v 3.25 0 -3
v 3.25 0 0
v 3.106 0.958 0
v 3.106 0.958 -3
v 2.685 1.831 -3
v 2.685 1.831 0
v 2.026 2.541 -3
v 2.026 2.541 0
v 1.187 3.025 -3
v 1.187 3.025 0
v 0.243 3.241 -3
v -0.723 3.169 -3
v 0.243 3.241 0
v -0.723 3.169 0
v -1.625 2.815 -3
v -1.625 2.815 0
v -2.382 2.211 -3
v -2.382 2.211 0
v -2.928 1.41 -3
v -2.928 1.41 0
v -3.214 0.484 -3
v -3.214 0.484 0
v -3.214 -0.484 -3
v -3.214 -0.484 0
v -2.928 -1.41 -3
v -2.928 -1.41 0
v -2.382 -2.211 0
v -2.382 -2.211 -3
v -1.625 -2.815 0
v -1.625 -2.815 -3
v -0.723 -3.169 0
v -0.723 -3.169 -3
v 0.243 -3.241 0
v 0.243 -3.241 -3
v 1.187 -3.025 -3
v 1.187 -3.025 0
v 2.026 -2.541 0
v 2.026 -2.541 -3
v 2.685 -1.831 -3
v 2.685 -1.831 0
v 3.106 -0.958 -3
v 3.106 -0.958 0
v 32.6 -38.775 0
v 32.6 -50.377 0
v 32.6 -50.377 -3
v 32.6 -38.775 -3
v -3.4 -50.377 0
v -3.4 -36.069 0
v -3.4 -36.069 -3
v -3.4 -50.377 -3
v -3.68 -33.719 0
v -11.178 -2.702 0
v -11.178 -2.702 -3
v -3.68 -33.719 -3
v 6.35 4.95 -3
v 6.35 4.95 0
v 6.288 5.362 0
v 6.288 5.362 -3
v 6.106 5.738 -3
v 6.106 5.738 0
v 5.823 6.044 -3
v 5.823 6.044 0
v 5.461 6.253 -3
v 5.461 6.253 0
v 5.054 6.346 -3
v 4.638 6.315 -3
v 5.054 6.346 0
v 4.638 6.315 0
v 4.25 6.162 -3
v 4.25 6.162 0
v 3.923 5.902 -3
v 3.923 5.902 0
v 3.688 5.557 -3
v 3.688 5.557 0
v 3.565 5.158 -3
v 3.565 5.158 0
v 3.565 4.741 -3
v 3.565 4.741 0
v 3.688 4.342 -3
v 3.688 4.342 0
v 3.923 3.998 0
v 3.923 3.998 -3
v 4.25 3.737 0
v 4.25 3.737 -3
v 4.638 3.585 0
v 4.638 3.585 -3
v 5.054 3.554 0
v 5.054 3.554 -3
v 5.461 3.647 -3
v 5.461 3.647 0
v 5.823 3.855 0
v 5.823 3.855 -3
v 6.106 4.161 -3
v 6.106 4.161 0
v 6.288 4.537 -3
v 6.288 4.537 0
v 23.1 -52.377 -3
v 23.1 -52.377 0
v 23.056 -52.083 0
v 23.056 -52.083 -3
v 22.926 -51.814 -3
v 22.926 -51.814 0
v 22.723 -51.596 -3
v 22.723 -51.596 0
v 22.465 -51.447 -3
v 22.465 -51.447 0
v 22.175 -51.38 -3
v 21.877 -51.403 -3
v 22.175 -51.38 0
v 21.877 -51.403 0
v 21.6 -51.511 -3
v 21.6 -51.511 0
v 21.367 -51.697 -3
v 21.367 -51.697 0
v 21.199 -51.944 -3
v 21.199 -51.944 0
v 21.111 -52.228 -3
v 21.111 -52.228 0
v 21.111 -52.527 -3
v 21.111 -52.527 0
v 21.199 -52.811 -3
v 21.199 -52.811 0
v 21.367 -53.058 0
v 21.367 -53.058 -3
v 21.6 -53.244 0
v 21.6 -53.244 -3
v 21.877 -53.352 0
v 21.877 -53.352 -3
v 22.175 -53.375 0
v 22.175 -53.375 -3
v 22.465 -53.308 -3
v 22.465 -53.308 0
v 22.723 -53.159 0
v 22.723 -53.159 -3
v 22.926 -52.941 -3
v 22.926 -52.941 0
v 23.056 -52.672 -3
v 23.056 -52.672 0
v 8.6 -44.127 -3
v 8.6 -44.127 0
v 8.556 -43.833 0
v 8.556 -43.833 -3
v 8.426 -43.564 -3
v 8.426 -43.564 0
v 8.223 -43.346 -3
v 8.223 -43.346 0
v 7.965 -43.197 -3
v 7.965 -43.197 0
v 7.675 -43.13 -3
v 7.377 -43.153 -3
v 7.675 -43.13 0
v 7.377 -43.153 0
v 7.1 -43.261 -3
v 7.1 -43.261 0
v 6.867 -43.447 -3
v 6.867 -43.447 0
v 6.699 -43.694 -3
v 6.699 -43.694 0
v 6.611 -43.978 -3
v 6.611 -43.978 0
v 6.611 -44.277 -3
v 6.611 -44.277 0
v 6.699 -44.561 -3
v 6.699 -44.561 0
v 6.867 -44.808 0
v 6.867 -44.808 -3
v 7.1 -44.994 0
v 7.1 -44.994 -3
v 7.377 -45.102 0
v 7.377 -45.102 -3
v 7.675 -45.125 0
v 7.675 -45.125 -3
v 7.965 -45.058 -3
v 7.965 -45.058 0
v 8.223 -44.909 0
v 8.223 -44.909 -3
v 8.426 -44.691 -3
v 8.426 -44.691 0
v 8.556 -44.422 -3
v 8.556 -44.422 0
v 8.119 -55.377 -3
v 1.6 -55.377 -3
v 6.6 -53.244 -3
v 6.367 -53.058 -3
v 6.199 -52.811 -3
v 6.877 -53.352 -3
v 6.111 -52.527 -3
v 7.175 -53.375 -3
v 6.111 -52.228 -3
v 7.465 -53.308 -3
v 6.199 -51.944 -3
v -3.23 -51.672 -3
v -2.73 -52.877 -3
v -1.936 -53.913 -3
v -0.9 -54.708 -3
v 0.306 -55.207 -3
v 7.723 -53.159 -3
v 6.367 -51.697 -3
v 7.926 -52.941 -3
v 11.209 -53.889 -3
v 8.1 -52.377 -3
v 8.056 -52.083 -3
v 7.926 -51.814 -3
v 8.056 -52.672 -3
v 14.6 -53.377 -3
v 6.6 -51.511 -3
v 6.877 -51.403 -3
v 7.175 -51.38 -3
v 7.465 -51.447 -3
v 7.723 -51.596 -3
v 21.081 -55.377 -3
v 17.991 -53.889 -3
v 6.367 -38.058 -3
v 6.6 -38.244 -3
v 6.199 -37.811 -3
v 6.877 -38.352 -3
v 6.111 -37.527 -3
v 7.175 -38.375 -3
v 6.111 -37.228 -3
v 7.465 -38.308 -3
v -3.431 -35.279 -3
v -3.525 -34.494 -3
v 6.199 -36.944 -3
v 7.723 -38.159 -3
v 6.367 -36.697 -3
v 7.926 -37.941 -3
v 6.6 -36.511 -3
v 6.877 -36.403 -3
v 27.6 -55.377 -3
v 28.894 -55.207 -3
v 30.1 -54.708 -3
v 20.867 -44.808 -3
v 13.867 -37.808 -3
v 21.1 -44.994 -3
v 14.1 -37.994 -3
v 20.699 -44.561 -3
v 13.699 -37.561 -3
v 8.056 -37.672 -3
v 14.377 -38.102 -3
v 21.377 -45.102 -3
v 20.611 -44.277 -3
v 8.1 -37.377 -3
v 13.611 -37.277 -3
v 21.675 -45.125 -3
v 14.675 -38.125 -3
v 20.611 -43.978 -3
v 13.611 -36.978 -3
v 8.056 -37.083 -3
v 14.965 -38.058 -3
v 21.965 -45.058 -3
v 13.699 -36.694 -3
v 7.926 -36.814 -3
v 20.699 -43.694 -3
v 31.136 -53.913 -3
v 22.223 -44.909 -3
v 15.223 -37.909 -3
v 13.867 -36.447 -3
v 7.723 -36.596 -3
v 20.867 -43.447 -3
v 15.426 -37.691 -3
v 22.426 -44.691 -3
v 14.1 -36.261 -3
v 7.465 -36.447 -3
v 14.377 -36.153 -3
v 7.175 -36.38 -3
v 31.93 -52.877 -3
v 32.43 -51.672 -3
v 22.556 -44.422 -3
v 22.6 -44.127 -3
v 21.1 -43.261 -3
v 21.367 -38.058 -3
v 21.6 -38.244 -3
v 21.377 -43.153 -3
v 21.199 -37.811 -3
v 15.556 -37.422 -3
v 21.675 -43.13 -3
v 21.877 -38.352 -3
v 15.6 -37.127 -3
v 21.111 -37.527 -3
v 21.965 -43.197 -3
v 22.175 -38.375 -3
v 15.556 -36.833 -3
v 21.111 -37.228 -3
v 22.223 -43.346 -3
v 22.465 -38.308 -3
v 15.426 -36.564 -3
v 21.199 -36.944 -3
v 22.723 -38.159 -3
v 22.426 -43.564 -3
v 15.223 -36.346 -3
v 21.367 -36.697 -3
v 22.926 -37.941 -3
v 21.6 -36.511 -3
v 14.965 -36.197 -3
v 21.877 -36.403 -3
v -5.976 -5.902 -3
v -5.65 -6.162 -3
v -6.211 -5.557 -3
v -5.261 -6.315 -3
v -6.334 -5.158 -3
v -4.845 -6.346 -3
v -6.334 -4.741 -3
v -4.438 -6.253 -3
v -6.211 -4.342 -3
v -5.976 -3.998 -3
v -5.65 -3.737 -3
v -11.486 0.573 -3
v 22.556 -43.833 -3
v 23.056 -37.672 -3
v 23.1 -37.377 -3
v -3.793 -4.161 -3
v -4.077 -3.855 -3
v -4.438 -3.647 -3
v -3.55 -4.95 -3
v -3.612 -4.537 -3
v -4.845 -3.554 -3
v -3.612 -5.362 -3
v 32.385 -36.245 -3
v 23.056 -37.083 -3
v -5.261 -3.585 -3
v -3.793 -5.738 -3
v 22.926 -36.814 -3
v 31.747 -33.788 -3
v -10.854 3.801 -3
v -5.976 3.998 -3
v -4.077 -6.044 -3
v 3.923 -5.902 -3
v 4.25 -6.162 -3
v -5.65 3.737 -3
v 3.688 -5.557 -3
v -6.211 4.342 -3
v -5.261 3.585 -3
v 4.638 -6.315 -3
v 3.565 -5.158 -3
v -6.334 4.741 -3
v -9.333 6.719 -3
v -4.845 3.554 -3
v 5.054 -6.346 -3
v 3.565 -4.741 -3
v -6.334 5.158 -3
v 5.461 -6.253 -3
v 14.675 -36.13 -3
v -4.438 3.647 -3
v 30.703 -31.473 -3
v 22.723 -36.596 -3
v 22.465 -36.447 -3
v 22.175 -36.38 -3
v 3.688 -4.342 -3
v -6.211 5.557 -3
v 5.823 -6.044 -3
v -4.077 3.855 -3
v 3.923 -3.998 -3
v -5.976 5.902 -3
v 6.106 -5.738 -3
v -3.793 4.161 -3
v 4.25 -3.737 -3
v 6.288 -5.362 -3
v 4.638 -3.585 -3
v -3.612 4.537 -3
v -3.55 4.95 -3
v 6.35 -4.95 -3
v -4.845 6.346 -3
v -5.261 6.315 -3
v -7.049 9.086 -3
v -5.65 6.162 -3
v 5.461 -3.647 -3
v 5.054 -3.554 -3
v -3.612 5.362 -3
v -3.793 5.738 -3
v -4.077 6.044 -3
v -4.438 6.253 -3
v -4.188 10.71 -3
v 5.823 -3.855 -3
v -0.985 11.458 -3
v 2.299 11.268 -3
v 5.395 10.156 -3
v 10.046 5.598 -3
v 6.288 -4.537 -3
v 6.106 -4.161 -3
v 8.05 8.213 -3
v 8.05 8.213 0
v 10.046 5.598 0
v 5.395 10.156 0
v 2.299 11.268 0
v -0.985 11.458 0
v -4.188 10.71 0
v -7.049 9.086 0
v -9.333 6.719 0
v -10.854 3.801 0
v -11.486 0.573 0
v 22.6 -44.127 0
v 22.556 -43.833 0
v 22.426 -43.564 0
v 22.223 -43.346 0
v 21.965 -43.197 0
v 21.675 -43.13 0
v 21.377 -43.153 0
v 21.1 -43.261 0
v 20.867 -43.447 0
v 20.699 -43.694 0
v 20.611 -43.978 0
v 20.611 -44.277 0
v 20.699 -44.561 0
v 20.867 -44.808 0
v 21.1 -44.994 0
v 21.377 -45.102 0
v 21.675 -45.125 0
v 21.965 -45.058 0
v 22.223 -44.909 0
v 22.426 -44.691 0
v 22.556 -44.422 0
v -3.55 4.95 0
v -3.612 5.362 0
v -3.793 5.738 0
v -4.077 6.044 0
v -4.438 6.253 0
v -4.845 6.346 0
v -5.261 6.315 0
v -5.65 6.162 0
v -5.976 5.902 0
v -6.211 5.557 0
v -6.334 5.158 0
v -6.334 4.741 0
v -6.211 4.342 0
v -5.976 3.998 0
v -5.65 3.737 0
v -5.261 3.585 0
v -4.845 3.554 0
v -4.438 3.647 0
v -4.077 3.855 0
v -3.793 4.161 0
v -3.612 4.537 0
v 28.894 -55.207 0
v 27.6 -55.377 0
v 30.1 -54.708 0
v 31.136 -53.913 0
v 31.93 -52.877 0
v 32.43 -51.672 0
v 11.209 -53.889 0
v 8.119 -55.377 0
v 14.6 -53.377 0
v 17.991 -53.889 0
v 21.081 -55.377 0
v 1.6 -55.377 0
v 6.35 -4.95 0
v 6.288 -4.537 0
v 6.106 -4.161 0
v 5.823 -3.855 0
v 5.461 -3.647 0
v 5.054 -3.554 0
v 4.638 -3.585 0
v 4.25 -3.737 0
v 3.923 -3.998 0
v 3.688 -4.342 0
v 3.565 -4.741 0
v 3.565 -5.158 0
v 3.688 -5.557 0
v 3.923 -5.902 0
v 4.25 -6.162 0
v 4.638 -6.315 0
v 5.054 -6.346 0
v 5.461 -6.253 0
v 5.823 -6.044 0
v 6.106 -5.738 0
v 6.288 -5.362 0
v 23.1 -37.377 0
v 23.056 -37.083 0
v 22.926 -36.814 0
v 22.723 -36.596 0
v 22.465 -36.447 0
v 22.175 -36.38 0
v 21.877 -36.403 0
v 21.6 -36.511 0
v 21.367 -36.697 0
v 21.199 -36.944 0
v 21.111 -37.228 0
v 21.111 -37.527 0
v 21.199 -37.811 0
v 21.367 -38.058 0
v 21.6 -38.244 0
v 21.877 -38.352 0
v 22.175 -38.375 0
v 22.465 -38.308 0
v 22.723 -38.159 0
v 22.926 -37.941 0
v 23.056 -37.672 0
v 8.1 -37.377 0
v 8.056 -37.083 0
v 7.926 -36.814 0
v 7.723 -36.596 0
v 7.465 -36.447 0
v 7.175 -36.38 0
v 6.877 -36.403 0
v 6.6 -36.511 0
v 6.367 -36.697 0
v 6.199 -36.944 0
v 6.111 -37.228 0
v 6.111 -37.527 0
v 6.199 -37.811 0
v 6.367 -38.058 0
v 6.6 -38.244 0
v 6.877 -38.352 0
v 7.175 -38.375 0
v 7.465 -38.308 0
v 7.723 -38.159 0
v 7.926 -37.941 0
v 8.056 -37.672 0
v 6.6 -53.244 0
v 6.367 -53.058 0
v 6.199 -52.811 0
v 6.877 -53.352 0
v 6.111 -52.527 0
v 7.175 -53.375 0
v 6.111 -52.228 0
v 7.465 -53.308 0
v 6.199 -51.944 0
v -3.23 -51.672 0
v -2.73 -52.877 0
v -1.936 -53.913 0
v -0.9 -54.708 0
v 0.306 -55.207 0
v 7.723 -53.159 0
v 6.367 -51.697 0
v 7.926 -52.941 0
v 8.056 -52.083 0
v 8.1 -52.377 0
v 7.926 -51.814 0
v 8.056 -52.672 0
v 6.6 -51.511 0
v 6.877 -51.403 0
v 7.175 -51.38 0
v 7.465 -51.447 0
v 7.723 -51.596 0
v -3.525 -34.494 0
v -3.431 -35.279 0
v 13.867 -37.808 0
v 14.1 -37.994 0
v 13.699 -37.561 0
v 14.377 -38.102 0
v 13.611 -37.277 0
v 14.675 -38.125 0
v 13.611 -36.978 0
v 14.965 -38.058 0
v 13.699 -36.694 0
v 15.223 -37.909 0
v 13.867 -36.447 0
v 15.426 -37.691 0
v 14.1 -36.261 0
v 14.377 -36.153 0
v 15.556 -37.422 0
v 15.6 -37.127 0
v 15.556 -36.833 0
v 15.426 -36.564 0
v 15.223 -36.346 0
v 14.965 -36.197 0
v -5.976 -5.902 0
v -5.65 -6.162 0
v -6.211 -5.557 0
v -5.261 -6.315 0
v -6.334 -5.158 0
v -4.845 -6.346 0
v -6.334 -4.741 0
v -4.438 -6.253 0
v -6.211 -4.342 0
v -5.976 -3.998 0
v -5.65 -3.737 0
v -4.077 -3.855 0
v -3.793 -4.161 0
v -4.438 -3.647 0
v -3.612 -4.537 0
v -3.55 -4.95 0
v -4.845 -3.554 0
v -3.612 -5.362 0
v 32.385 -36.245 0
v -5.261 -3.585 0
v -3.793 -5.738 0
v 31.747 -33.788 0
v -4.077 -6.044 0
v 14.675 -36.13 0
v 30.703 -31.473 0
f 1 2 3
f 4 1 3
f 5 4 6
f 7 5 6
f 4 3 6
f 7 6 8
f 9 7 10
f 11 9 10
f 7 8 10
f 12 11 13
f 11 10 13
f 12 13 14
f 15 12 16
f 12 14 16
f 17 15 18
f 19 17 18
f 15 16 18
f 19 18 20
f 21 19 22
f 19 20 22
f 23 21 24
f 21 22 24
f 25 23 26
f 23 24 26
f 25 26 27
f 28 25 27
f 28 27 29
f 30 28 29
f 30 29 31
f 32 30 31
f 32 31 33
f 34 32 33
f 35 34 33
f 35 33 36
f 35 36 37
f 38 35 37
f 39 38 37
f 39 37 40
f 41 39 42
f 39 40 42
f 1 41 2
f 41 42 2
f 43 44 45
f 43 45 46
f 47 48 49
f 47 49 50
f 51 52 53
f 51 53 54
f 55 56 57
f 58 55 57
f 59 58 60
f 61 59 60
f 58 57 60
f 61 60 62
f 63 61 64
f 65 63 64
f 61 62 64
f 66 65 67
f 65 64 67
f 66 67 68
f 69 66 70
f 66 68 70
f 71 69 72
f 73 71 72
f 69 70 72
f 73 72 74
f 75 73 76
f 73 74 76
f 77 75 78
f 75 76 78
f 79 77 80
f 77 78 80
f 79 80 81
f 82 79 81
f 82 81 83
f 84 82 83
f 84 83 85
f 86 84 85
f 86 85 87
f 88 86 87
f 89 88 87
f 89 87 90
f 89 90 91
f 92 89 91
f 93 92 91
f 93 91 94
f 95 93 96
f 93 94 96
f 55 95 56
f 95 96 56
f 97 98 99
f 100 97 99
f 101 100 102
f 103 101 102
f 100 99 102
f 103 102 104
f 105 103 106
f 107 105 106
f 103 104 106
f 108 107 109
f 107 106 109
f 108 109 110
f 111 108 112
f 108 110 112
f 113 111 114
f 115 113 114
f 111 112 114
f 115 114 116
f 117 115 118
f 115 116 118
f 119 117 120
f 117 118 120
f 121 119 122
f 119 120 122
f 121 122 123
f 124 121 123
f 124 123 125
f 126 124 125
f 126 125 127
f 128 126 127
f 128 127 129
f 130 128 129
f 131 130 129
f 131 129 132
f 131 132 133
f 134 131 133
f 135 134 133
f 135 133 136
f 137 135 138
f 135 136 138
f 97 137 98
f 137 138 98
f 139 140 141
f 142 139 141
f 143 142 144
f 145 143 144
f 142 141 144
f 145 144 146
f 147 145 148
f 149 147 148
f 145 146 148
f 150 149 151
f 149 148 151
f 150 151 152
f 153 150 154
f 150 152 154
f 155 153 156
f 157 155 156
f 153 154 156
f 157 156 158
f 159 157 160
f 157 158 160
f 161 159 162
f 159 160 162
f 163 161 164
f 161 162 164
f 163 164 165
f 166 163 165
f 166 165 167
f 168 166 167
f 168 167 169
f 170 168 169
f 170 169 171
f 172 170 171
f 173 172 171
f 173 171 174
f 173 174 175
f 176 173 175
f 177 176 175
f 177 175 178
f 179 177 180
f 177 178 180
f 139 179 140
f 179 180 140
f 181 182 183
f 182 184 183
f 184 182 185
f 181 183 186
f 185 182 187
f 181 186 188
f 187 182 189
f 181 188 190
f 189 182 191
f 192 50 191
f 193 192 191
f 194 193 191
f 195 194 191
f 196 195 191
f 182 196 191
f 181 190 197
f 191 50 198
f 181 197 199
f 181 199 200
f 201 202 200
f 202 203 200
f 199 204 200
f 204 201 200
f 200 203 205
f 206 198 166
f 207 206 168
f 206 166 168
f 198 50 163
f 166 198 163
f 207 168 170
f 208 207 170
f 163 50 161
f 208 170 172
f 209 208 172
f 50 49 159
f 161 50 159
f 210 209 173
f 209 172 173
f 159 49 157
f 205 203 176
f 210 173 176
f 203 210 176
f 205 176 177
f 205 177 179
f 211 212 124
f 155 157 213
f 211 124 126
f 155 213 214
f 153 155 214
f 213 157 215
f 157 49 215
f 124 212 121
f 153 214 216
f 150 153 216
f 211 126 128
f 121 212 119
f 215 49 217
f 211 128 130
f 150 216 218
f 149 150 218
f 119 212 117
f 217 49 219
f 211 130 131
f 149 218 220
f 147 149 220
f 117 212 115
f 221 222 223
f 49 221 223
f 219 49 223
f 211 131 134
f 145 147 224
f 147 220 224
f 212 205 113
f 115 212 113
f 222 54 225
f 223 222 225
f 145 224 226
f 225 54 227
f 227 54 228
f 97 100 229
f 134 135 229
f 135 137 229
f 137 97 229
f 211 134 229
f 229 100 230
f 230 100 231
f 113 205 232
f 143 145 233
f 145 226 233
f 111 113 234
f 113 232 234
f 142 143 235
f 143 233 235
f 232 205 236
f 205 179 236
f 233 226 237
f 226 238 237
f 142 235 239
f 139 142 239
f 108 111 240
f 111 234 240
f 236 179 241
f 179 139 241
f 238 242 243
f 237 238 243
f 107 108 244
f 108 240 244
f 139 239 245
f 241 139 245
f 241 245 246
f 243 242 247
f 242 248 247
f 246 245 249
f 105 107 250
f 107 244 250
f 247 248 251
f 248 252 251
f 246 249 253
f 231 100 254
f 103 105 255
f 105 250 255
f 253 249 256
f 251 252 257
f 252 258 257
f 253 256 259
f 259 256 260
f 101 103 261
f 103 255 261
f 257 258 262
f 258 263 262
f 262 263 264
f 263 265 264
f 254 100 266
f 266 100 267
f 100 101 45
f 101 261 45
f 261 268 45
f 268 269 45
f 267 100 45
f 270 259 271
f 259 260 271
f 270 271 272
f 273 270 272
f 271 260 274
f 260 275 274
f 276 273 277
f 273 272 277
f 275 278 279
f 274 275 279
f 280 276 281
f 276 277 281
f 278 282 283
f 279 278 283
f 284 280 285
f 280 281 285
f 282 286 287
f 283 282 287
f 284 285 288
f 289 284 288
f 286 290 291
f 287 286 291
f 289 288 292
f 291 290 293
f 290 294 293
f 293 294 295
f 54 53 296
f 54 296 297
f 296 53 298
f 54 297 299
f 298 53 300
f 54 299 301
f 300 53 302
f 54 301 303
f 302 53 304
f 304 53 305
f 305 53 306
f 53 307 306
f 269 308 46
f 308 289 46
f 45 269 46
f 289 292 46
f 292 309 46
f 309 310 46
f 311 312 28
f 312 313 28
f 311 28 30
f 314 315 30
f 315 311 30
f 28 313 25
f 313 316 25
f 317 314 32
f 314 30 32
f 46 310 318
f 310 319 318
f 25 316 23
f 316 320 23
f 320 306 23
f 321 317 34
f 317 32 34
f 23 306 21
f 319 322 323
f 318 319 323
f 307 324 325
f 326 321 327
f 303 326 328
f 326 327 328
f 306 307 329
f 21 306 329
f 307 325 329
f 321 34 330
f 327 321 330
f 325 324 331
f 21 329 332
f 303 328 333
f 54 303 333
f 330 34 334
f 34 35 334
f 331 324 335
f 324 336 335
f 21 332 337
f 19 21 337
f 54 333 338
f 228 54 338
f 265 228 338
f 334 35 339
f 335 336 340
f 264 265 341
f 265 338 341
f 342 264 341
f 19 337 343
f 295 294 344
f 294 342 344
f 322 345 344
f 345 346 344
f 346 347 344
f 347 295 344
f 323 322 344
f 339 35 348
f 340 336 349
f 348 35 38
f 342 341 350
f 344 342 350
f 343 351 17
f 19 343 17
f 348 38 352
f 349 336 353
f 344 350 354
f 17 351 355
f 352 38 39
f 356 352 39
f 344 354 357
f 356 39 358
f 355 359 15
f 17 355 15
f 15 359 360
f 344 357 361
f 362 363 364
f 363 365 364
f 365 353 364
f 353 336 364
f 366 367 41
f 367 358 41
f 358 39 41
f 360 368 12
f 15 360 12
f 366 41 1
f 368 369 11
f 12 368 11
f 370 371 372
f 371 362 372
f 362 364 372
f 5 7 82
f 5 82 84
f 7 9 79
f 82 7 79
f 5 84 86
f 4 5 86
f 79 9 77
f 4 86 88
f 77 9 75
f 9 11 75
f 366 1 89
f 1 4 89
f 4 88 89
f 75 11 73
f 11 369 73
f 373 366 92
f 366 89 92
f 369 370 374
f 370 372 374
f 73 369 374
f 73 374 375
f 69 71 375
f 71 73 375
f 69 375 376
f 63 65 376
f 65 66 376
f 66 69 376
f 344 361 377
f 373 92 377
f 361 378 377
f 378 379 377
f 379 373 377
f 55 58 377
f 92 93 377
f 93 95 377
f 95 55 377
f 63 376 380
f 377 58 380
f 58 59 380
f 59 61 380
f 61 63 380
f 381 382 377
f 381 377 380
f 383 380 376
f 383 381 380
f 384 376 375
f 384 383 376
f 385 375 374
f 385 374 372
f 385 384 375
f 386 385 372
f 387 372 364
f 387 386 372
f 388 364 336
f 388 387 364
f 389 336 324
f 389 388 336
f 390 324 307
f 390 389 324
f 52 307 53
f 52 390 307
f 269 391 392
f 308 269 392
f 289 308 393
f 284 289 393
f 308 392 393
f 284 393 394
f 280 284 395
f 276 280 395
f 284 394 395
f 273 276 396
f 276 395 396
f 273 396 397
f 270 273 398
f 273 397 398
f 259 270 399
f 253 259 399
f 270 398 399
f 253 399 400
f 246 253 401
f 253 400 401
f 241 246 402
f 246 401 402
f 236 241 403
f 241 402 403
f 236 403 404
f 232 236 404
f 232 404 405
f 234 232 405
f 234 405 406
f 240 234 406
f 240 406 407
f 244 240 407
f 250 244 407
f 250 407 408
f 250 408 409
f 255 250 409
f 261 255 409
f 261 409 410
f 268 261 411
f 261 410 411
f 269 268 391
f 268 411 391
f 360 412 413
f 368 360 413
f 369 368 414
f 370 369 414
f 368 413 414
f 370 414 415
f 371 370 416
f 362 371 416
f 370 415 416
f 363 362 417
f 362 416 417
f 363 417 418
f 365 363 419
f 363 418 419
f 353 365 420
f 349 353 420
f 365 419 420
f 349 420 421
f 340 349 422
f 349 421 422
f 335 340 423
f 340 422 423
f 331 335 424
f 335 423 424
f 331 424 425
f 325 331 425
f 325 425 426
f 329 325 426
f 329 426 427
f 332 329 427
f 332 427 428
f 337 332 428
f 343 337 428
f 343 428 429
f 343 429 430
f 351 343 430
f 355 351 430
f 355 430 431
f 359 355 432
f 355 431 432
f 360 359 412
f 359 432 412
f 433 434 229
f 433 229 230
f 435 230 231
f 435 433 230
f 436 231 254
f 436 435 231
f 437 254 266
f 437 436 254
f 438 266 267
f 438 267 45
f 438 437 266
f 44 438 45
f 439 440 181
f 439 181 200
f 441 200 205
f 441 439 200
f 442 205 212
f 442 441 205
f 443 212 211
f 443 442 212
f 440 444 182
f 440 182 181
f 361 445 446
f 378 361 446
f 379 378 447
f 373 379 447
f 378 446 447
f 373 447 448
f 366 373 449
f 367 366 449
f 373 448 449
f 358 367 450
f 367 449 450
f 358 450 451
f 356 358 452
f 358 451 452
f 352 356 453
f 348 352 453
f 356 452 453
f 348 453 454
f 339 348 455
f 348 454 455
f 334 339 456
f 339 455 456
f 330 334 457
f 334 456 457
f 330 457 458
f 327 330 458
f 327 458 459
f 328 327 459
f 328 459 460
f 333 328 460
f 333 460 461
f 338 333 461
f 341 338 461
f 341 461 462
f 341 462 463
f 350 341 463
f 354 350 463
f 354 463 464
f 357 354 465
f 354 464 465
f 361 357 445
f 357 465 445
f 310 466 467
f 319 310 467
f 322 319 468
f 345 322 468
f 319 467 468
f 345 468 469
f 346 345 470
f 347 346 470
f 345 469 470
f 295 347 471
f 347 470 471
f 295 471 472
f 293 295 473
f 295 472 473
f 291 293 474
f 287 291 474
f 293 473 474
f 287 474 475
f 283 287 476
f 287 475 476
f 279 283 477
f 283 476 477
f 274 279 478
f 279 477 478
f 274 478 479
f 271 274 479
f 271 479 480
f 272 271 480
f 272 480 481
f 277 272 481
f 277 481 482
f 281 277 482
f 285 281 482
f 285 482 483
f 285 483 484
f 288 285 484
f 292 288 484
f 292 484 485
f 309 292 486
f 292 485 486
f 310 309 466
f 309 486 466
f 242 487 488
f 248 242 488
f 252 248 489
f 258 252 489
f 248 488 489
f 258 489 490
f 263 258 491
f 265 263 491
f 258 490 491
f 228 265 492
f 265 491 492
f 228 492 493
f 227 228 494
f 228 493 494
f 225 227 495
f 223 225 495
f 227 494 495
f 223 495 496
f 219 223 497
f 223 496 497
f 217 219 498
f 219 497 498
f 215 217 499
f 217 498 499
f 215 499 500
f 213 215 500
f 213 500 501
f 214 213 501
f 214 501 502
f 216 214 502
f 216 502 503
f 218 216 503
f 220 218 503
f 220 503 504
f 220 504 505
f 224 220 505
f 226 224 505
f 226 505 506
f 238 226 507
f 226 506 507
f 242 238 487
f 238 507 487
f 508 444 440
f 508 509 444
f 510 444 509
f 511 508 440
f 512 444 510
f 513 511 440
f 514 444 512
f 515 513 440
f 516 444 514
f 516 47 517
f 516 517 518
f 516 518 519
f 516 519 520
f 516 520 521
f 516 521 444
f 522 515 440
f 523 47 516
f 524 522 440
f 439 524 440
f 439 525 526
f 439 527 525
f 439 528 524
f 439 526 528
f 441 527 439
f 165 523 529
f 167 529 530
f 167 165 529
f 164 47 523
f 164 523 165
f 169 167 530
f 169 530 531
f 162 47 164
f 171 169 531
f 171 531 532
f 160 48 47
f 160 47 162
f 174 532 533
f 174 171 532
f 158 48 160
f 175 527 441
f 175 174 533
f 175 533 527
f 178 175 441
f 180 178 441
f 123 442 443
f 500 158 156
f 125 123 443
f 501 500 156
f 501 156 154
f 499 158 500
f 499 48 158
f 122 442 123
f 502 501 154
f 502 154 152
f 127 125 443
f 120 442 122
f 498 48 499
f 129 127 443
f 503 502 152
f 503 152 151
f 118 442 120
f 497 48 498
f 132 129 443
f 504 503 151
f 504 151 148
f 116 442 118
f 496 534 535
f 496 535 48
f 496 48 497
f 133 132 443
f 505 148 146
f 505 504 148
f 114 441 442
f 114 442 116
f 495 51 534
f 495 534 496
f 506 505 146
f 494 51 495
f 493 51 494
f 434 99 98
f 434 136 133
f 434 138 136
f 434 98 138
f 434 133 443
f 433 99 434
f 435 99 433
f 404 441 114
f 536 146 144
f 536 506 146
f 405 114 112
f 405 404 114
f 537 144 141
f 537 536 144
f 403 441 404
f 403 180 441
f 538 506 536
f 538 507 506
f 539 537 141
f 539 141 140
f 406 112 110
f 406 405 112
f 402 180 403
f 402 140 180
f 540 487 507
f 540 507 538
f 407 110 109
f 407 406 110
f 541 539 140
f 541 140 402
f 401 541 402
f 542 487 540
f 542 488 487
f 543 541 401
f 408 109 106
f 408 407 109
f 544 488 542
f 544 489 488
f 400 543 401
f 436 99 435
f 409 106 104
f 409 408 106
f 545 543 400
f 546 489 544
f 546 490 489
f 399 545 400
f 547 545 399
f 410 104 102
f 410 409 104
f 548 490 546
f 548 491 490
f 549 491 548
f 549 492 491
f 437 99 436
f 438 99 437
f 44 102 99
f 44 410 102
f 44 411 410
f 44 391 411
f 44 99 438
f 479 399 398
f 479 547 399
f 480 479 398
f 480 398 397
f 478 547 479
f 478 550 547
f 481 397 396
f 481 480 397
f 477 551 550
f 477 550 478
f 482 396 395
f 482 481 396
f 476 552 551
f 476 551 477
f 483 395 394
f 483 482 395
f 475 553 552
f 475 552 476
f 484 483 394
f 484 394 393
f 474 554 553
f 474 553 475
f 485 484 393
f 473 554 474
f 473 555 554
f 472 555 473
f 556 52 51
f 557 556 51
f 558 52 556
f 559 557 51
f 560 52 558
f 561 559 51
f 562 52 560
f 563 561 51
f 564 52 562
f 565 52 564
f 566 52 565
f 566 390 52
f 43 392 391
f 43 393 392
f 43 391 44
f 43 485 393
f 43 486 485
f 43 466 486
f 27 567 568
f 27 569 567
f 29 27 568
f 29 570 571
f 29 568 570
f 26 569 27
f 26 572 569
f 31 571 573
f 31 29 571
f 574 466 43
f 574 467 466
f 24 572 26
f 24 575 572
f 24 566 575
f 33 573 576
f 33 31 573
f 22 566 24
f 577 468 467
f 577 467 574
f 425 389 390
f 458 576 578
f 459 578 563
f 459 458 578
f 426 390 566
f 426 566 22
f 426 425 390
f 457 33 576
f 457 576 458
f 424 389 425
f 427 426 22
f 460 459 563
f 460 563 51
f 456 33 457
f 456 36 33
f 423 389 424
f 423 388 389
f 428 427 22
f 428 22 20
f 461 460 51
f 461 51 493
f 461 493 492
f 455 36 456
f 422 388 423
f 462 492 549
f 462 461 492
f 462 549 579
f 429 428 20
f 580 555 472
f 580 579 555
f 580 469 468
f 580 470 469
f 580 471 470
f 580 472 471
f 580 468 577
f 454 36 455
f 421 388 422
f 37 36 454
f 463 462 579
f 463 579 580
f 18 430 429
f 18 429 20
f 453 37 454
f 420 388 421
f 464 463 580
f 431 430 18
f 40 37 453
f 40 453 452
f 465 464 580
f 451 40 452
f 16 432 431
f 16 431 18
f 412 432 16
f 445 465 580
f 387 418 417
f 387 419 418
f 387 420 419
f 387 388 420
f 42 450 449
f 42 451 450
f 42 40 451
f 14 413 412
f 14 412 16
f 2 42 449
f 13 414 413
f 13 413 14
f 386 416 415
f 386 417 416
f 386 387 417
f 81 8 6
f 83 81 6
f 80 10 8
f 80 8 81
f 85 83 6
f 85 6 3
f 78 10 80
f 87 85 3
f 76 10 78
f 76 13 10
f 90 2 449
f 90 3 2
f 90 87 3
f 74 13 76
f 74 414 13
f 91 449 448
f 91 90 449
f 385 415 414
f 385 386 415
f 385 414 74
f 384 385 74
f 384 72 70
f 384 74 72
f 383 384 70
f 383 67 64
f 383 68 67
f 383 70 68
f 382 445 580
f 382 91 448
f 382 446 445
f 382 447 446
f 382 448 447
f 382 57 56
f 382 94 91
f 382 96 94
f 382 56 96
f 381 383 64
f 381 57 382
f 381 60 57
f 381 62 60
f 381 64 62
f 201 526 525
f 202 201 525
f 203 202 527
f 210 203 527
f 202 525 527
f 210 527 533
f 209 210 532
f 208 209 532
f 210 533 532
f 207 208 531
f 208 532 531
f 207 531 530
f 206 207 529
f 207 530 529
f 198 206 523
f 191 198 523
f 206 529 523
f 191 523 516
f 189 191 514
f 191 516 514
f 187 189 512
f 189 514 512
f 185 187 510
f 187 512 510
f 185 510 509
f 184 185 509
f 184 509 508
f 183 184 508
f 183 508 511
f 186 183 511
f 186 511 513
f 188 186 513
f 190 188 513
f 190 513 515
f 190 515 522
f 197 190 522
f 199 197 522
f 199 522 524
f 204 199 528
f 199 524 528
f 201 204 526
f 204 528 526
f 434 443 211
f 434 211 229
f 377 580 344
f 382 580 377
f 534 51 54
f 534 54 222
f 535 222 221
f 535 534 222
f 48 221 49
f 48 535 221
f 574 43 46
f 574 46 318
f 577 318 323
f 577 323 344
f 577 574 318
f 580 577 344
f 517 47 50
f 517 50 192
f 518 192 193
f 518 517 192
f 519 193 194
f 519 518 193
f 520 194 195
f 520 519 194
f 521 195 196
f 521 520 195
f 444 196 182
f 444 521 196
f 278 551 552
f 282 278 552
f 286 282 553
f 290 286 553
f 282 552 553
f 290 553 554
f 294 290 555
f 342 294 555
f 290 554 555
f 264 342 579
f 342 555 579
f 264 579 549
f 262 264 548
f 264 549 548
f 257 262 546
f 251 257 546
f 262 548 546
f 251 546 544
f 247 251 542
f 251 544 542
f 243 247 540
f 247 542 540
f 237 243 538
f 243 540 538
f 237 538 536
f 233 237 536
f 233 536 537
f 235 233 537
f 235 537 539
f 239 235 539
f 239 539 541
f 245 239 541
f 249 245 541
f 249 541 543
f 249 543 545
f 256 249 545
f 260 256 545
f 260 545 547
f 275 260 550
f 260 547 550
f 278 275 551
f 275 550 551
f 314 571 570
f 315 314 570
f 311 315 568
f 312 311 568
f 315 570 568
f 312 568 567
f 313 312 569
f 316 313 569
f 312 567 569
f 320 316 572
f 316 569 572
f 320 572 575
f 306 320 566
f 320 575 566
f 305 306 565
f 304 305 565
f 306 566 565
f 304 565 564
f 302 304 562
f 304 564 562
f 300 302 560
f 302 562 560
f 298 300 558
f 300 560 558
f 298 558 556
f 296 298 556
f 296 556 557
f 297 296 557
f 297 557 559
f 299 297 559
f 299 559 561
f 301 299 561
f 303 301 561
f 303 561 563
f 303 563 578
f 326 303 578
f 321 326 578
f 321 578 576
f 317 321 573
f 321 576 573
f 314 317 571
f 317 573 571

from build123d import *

# Parameters (mm, degrees)
SKETCH_1_R      = 3.25
SKETCH_1_R_2    = 1.4
SKETCH_1_R_3    = 1
EXTRUDE_1_DEPTH = 3


with BuildPart() as part:
    # Эскиз1 → Бобышка-Вытянуть1 (new body)
    with BuildSketch(Plane.XY):
        with BuildLine():
            Line((1.6, -55.377499952), (8.119259302, -55.377499952))
            ThreePointArc((8.119259302, -55.377499952), (14.6, -53.377499952), (21.080740698, -55.377499952))
            Line((21.080740698, -55.377499952), (27.6, -55.377499952))
            ThreePointArc((27.6, -55.377499952), (31.135533906, -53.913033858), (32.6, -50.377499952))
            Line((32.6, -50.377499952), (32.6, -38.774674064))
            ThreePointArc((32.6, -38.774674064), (32.11800347, -35.002728245), (30.702989966, -31.473191066))
            Line((30.702989966, -31.473191066), (10.04562564, 5.597803631))
            ThreePointArc((10.04562564, 5.597803631), (-4.188430146, 10.710137857), (-11.17802813, -2.702163414))
            Line((-11.17802813, -2.702163414), (-3.679975539, -33.719326307))
            ThreePointArc((-3.679975539, -33.719326307), (-3.470240572, -34.885869352), (-3.4, -36.069033624))
            Line((-3.4, -36.069033624), (-3.4, -50.377499952))
            ThreePointArc((-3.4, -50.377499952), (-1.935533906, -53.913033858), (1.6, -55.377499952))
        make_face()
        Circle(SKETCH_1_R, mode=Mode.SUBTRACT)
        with Locations((-4.949747468, 4.949747468)):
            Circle(SKETCH_1_R_2, mode=Mode.SUBTRACT)
        with Locations((4.949747468, 4.949747468)):
            Circle(SKETCH_1_R_2, mode=Mode.SUBTRACT)
        with Locations((4.949747468, -4.949747468)):
            Circle(SKETCH_1_R_2, mode=Mode.SUBTRACT)
        with Locations((-4.949747468, -4.949747468)):
            Circle(SKETCH_1_R_2, mode=Mode.SUBTRACT)
        with Locations((7.1, -37.377499952)):
            Circle(SKETCH_1_R_3, mode=Mode.SUBTRACT)
        with Locations((22.1, -37.377499952)):
            Circle(SKETCH_1_R_3, mode=Mode.SUBTRACT)
        with Locations((7.1, -52.377499952)):
            Circle(SKETCH_1_R_3, mode=Mode.SUBTRACT)
        with Locations((22.1, -52.377499952)):
            Circle(SKETCH_1_R_3, mode=Mode.SUBTRACT)
        with Locations((14.6, -37.127499952)):
            Circle(SKETCH_1_R_3, mode=Mode.SUBTRACT)
        with Locations((21.6, -44.127499952)):
            Circle(SKETCH_1_R_3, mode=Mode.SUBTRACT)
        with Locations((7.6, -44.127499952)):
            Circle(SKETCH_1_R_3, mode=Mode.SUBTRACT)
    extrude(amount=-EXTRUDE_1_DEPTH)


solid = part.part
